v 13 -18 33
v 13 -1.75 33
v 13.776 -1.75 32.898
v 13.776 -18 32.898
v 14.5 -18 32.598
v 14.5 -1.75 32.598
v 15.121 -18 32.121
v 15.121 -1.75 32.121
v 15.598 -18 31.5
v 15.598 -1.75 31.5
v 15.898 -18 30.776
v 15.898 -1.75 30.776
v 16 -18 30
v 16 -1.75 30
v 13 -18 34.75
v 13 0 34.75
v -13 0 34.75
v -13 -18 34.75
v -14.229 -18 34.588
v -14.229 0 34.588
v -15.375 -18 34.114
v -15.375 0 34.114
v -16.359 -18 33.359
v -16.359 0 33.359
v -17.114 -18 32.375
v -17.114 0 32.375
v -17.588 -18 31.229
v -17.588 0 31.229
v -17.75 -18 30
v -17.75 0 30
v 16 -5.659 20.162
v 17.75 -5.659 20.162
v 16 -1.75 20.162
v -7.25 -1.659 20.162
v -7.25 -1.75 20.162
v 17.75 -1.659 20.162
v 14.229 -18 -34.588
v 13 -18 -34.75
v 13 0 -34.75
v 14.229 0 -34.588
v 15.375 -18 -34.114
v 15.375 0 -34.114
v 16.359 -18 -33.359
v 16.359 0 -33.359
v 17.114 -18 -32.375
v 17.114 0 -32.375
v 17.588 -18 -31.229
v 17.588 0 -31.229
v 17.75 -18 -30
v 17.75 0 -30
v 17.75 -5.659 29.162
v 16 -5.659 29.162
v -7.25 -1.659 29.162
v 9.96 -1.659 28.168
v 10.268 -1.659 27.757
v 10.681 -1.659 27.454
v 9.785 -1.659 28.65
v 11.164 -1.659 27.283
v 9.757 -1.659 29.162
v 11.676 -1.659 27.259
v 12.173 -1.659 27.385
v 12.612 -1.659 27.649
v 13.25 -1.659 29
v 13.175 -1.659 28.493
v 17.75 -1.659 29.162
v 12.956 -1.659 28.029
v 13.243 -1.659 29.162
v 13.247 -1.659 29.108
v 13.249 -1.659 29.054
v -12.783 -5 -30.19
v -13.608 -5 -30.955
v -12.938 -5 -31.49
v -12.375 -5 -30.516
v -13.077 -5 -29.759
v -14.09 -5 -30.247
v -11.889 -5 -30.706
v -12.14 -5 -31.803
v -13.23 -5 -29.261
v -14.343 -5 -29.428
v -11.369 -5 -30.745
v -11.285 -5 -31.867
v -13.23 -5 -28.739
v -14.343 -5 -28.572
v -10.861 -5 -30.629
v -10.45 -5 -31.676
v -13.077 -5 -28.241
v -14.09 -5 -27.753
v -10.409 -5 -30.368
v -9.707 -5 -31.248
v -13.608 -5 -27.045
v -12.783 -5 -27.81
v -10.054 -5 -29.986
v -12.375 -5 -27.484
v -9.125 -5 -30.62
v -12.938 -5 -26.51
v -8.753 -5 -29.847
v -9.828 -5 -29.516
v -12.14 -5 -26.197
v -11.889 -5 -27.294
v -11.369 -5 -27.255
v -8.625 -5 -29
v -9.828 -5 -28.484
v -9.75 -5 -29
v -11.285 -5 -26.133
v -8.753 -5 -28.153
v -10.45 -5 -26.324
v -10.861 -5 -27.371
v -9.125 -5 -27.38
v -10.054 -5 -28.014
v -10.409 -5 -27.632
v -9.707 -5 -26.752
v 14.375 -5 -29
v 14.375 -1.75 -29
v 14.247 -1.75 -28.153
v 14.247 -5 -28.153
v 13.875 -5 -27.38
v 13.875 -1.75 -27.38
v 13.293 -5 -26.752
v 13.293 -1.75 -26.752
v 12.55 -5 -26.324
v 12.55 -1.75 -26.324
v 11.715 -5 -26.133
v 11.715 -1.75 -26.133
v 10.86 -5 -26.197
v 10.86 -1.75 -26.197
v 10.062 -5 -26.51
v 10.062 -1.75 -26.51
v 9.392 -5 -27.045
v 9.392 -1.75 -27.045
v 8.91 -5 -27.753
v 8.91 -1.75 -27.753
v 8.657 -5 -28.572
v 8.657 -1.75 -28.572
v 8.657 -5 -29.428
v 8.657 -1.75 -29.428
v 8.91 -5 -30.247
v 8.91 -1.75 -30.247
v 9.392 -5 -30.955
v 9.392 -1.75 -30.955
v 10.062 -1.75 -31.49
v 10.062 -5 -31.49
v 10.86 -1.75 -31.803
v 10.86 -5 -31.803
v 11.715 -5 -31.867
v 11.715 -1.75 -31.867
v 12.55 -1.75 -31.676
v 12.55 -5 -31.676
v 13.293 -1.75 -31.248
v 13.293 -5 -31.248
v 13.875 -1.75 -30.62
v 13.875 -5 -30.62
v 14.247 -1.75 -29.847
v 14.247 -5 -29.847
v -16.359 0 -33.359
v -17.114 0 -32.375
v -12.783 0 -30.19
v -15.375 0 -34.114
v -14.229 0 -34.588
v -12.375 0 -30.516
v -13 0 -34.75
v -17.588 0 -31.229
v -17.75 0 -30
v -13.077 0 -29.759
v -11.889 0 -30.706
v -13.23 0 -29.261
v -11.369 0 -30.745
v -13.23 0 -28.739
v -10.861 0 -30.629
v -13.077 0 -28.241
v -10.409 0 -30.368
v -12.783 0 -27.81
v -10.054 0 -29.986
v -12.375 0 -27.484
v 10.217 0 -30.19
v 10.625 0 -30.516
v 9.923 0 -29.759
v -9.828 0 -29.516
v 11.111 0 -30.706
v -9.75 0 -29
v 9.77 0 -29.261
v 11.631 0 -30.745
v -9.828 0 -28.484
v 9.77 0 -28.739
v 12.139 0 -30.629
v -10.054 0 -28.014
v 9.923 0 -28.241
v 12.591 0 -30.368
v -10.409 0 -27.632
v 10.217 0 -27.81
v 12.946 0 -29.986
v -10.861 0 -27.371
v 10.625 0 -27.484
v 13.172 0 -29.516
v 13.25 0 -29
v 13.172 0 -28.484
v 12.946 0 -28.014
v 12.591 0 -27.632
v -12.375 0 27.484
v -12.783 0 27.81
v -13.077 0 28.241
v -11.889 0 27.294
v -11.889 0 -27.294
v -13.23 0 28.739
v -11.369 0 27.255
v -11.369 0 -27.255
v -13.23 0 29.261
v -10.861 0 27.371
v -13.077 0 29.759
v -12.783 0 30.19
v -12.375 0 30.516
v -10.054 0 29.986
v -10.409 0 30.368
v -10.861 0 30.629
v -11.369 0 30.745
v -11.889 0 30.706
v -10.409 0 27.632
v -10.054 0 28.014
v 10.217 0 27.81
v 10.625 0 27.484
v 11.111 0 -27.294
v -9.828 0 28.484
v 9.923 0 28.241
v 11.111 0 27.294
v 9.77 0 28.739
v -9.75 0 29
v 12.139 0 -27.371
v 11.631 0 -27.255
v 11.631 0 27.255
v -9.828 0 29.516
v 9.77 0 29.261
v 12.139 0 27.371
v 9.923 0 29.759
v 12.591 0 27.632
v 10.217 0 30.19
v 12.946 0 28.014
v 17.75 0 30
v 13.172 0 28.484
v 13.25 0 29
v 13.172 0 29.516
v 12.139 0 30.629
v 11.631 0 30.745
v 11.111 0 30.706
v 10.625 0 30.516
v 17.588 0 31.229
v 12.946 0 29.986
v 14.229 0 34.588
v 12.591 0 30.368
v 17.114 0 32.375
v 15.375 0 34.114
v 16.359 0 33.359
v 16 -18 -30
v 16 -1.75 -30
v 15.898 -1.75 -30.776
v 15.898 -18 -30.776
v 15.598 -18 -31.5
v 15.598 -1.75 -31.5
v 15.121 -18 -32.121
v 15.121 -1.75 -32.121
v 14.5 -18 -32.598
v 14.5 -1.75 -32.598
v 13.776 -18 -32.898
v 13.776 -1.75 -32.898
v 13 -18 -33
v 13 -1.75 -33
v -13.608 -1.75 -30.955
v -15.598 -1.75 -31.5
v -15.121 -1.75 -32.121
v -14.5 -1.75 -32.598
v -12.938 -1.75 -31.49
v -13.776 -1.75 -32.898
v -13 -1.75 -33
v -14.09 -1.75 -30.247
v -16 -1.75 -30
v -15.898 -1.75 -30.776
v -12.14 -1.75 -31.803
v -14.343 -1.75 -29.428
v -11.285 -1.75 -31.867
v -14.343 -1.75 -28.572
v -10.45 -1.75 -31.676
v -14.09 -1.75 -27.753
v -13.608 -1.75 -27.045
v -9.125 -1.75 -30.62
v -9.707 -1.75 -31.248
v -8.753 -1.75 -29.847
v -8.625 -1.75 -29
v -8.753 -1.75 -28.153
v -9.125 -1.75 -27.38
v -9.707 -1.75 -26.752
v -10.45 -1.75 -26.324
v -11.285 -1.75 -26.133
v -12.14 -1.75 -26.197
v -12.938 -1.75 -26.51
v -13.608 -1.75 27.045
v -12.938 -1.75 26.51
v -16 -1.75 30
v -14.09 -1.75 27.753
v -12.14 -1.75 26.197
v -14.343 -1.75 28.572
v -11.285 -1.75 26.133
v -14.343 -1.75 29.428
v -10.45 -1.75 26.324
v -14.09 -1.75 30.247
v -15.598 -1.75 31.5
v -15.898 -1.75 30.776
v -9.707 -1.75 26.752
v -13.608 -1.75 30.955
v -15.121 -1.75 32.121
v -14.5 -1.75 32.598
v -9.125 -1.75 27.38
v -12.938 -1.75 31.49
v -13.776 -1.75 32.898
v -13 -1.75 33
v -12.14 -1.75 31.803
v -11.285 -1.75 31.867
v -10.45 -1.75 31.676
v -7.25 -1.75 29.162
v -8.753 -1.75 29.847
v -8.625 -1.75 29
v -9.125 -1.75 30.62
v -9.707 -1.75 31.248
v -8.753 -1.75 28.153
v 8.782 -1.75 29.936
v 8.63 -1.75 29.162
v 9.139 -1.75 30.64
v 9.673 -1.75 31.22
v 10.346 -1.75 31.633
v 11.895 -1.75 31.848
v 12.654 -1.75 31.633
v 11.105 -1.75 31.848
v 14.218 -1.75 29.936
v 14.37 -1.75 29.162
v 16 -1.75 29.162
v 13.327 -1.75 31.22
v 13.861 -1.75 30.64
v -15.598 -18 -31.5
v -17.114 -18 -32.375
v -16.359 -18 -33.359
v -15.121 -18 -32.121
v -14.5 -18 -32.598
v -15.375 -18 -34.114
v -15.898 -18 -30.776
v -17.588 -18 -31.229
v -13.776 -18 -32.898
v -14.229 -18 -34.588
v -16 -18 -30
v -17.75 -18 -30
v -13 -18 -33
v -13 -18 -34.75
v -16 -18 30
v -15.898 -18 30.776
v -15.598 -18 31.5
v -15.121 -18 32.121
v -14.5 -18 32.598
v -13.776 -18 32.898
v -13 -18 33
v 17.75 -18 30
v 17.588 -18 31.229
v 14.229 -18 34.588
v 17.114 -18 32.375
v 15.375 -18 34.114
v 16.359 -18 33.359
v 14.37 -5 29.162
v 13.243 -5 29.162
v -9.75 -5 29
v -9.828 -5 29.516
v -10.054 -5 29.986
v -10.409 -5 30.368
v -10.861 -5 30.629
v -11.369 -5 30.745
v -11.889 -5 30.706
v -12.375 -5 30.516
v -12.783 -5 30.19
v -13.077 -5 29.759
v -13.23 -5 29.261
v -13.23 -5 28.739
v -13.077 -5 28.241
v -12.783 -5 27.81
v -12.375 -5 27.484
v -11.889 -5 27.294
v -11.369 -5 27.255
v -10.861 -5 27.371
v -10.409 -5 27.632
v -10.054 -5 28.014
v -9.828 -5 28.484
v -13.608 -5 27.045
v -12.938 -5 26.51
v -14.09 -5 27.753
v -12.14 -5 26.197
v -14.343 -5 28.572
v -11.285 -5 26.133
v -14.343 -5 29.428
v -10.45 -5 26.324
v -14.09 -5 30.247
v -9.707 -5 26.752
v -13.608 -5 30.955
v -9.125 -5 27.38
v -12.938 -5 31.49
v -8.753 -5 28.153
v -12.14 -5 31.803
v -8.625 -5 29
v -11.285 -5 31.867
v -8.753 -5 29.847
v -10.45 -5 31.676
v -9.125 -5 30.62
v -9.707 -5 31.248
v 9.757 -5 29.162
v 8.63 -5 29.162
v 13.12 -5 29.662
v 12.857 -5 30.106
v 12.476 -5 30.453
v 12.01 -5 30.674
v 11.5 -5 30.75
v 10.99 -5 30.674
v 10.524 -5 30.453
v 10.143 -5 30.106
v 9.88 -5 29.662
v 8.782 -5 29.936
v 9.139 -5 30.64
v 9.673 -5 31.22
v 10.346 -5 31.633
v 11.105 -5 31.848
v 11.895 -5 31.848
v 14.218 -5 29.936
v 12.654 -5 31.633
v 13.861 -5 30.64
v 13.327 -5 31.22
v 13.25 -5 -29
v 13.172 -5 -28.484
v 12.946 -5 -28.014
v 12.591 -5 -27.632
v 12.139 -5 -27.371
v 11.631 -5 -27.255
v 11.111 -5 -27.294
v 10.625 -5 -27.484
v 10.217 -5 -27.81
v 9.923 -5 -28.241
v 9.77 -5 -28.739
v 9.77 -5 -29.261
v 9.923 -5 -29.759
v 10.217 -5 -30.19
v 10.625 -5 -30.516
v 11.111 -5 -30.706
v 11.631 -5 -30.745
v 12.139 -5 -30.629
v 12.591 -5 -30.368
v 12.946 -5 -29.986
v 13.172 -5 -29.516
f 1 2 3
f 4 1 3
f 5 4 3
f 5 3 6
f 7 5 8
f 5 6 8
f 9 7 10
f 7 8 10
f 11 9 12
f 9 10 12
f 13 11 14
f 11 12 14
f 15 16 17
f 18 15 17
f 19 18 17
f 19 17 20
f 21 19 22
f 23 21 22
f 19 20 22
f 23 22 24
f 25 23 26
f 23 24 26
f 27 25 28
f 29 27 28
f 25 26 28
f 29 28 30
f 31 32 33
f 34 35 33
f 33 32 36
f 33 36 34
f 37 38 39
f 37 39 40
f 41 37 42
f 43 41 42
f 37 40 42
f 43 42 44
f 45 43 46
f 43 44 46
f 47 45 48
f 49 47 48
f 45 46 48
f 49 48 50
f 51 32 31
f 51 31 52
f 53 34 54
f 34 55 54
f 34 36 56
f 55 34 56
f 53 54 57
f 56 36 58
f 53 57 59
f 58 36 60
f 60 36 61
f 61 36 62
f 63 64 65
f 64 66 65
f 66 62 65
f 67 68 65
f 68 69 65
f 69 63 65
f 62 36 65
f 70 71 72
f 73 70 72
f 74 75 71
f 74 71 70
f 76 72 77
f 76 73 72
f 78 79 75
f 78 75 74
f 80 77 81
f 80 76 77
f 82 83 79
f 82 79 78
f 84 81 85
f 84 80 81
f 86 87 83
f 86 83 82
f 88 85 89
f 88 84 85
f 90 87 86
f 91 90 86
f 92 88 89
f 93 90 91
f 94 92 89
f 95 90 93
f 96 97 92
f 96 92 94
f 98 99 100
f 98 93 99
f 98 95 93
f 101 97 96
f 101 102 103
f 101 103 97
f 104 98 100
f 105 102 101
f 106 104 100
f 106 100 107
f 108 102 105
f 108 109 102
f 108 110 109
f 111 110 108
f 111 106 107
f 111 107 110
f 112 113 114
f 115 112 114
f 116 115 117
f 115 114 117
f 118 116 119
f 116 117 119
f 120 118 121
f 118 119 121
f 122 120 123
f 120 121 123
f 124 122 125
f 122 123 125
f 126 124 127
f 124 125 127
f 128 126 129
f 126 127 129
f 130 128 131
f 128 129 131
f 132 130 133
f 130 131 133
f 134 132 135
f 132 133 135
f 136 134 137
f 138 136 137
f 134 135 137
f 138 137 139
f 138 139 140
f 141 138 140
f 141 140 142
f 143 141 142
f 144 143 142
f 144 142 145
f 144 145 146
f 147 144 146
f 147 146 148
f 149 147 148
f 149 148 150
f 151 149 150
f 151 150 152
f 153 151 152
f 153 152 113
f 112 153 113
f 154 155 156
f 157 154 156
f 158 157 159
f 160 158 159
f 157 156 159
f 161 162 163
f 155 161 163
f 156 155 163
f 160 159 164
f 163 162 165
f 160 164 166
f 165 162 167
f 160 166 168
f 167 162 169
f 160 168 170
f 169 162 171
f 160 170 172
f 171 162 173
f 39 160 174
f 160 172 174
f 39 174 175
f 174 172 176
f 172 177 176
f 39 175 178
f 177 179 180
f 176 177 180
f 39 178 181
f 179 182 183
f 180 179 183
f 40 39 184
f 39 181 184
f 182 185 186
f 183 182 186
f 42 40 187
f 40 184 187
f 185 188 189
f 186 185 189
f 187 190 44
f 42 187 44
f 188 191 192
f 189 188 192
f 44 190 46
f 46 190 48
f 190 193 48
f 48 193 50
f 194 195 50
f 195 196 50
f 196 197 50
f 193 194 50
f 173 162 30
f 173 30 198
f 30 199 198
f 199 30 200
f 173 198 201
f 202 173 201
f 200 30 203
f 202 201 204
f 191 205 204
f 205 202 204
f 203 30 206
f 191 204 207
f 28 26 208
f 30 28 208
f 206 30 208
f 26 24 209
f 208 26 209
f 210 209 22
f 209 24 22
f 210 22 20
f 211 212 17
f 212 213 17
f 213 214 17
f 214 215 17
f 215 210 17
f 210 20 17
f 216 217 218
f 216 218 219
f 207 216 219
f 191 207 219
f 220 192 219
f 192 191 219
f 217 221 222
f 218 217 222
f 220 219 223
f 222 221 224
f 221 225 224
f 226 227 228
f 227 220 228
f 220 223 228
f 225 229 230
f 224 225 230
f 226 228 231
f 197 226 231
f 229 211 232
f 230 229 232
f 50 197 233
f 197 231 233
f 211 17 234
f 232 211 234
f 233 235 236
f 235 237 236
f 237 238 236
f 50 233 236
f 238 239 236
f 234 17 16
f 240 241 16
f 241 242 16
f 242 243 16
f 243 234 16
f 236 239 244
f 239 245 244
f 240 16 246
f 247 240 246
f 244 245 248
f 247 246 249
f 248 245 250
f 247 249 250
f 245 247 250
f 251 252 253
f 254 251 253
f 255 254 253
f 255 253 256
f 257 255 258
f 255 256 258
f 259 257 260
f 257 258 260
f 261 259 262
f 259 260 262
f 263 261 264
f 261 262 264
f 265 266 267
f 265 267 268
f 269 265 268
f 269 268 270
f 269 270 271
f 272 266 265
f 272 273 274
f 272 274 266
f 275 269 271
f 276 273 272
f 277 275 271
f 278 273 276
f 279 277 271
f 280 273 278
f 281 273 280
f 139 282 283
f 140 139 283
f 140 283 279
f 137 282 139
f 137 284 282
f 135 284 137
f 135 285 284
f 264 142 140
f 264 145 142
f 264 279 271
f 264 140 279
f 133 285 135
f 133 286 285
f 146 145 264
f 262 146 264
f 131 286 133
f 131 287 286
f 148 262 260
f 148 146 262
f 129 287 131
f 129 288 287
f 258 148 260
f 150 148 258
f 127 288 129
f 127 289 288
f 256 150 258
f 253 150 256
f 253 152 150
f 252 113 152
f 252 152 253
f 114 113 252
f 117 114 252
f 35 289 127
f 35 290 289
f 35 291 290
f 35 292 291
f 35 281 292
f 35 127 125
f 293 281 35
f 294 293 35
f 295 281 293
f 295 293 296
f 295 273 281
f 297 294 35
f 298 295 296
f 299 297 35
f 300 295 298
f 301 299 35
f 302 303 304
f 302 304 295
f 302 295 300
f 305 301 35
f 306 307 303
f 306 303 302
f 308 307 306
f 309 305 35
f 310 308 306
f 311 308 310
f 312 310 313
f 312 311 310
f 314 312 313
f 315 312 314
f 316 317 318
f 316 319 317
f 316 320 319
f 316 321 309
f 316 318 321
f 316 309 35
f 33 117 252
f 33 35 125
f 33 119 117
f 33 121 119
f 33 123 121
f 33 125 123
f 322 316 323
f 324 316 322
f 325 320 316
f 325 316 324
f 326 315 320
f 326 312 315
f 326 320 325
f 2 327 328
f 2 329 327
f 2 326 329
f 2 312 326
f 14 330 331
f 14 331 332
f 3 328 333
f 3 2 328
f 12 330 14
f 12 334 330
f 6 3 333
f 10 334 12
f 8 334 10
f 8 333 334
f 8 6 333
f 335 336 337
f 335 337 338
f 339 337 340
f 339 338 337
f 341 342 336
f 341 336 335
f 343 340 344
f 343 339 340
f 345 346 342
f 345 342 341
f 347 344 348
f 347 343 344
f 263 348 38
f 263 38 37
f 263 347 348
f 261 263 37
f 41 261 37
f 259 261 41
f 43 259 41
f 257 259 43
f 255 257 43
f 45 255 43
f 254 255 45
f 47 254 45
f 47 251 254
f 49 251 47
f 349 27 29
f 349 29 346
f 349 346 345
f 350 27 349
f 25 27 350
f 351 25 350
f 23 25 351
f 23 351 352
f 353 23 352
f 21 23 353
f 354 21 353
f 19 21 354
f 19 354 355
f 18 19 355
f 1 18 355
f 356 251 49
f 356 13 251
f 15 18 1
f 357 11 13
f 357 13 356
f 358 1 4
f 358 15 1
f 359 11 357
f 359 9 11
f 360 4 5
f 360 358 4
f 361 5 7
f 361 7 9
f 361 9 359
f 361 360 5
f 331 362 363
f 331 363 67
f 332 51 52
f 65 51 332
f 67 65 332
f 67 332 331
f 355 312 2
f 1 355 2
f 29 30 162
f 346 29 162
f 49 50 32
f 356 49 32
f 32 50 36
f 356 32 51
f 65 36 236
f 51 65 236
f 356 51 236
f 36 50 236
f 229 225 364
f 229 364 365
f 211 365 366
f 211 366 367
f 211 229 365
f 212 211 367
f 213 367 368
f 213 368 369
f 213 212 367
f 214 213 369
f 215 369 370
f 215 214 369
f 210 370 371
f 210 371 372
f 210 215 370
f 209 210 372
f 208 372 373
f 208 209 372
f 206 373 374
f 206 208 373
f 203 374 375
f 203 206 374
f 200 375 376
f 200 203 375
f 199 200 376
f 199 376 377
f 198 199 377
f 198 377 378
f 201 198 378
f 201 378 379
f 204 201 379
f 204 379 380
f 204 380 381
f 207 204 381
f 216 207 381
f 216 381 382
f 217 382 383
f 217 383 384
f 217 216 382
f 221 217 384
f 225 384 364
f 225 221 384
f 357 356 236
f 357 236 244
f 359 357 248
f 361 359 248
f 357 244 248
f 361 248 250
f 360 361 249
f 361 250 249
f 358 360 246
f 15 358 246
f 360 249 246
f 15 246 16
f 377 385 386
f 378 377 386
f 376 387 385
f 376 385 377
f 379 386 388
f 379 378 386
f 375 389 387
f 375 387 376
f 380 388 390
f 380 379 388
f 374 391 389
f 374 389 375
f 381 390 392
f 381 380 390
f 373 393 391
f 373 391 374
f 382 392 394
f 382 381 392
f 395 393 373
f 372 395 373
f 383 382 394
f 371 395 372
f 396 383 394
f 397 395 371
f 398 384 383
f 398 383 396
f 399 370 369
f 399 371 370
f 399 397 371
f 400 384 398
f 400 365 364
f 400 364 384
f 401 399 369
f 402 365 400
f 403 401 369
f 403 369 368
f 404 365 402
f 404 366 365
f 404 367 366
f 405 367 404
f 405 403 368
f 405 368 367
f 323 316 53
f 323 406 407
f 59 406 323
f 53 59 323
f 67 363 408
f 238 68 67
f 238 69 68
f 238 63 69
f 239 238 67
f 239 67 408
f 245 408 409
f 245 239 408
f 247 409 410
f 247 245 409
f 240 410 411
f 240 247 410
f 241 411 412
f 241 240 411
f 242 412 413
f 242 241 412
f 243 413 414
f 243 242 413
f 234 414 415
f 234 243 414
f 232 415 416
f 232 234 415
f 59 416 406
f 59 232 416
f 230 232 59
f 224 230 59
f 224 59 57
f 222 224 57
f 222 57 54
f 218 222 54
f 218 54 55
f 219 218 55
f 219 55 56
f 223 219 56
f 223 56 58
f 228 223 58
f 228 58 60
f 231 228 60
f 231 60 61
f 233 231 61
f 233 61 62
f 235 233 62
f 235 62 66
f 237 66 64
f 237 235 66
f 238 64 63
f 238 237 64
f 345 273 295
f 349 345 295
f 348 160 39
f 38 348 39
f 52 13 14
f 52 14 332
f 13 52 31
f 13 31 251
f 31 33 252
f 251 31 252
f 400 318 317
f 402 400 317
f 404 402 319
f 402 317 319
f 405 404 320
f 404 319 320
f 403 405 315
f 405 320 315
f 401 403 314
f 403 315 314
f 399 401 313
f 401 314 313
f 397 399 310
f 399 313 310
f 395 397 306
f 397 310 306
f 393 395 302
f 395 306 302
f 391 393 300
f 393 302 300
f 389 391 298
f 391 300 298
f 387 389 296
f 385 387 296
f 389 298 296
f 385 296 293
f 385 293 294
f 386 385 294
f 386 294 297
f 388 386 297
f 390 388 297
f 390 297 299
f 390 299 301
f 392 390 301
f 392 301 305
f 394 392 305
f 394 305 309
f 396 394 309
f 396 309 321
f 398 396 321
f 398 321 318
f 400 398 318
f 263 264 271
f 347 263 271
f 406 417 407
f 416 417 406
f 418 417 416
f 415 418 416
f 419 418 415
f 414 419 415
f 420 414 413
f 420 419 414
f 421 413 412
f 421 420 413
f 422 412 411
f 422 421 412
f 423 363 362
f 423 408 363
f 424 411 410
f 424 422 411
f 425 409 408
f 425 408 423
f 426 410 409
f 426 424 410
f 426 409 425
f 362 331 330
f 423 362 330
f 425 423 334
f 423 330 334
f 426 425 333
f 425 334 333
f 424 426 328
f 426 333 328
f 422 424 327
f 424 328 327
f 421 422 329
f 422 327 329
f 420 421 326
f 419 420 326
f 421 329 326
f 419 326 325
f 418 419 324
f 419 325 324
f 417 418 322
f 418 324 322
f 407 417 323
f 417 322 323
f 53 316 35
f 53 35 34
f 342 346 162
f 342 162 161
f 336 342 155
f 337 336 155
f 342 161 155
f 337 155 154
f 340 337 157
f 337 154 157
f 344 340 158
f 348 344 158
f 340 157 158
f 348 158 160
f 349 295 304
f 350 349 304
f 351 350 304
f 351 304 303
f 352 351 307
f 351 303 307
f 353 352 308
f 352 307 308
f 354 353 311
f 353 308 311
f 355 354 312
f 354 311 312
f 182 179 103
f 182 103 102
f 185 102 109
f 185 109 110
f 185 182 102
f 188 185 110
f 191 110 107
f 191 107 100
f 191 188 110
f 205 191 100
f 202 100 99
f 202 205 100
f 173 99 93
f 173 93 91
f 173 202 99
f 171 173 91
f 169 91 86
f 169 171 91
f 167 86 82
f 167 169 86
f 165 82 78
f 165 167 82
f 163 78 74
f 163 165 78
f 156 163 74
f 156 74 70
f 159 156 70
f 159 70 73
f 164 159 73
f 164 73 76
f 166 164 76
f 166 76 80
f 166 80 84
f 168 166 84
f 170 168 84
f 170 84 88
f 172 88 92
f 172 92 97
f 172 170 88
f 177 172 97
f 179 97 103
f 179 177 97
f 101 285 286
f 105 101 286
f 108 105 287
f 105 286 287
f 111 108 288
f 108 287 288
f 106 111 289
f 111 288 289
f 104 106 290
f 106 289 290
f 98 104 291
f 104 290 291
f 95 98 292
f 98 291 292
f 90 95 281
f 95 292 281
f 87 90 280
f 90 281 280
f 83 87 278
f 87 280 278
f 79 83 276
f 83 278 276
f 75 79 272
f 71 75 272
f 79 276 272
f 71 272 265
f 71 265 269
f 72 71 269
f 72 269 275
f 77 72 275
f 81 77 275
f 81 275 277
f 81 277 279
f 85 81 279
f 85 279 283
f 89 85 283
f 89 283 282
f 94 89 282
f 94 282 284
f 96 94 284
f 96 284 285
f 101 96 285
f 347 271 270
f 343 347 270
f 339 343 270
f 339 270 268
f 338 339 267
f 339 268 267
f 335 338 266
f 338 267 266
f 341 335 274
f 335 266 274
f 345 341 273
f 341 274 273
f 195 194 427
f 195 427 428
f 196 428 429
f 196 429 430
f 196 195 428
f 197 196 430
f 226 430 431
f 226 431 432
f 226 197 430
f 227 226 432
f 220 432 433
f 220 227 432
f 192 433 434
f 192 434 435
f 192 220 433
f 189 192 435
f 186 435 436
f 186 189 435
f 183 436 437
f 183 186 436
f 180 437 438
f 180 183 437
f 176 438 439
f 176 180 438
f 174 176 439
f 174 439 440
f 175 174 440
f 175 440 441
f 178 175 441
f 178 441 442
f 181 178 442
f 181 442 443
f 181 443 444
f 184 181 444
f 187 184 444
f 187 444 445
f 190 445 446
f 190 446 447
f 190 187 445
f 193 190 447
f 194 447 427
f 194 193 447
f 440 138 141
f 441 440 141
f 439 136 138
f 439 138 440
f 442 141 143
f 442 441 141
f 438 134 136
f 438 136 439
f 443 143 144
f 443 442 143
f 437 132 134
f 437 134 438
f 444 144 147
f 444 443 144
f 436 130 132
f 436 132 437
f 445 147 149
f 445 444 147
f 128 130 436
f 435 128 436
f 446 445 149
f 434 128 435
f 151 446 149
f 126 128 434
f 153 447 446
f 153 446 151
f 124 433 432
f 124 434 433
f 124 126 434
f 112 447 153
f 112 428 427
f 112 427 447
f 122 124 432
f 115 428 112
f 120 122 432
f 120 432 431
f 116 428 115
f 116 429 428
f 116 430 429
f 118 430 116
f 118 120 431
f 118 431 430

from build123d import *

# Parameters (mm, degrees)
F0_R     = 2.875
F1_DEPTH = 1.75
F2_DEPTH = 18
F0_R_2   = 1.75
F3_DEPTH = 5
F4_W     = 4
F4_H     = 9
F5_DEPTH = 25


with BuildPart() as f1:
    # F0 (on Front) → F1 (new body)
    with BuildSketch(Plane.XZ):
        with BuildLine():
            ThreePointArc((-13, 33), (-15.12132, 32.12132), (-16, 30))
            Line((-16, 30), (-16, -30))
            ThreePointArc((-16, -30), (-15.12132, -32.12132), (-13, -33))
            Line((-13, -33), (13, -33))
            ThreePointArc((13, -33), (15.12132, -32.12132), (16, -30))
            Line((16, -30), (16, 30))
            ThreePointArc((16, 30), (15.12132, 32.12132), (13, 33))
            Line((13, 33), (-13, 33))
        make_face()
        with Locations((-11.5, -29)):
            Circle(F0_R, mode=Mode.SUBTRACT)
        with Locations((11.5, -29)):
            Circle(F0_R, mode=Mode.SUBTRACT)
        with Locations((-11.5, 29)):
            Circle(F0_R, mode=Mode.SUBTRACT)
        with Locations((11.5, 29)):
            Circle(F0_R, mode=Mode.SUBTRACT)
    extrude(amount=F1_DEPTH)

    # F0 (on Front) → F2 (join)
    with BuildSketch(Plane.XZ):
        with BuildLine():
            Line((13, 34.75), (-13, 34.75))
            ThreePointArc((-13, 34.75), (-16.358757, 33.358757), (-17.75, 30))
            Line((-17.75, 30), (-17.75, -30))
            ThreePointArc((-17.75, -30), (-16.358757, -33.358757), (-13, -34.75))
            Line((-13, -34.75), (13, -34.75))
            ThreePointArc((13, -34.75), (16.358757, -33.358757), (17.75, -30))
            Line((17.75, -30), (17.75, 30))
            ThreePointArc((17.75, 30), (16.358757, 33.358757), (13, 34.75))
        make_face()
        with BuildLine():
            Line((-16, -30), (-16, 30))
            ThreePointArc((-16, 30), (-15.12132, 32.12132), (-13, 33))
            Line((-13, 33), (13, 33))
            ThreePointArc((13, 33), (15.12132, 32.12132), (16, 30))
            Line((16, 30), (16, -30))
            ThreePointArc((16, -30), (15.12132, -32.12132), (13, -33))
            Line((13, -33), (-13, -33))
            ThreePointArc((-13, -33), (-15.12132, -32.12132), (-16, -30))
        make_face(mode=Mode.SUBTRACT)
    extrude(amount=F2_DEPTH)

    # F0 (on Front) → F3 (join)
    with BuildSketch(Plane.XZ):
        with Locations((-11.5, 29)):
            Circle(F0_R)
        with Locations((-11.5, 29)):
            Circle(F0_R_2, mode=Mode.SUBTRACT)
        with Locations((11.5, 29)):
            Circle(F0_R)
        with Locations((11.5, 29)):
            Circle(F0_R_2, mode=Mode.SUBTRACT)
        with Locations((11.5, -29)):
            Circle(F0_R)
        with Locations((11.5, -29)):
            Circle(F0_R_2, mode=Mode.SUBTRACT)
        with Locations((-11.5, -29)):
            Circle(F0_R)
        with Locations((-11.5, -29)):
            Circle(F0_R_2, mode=Mode.SUBTRACT)
    extrude(amount=F3_DEPTH)

    # F4 (on face) → F5 (cut)
    with BuildSketch(Plane.YZ.offset(17.75)):
        with Locations((-3.6589, 24.661605)):
            Rectangle(F4_W, F4_H)
    extrude(amount=-F5_DEPTH, mode=Mode.SUBTRACT)


solid = f1.part
